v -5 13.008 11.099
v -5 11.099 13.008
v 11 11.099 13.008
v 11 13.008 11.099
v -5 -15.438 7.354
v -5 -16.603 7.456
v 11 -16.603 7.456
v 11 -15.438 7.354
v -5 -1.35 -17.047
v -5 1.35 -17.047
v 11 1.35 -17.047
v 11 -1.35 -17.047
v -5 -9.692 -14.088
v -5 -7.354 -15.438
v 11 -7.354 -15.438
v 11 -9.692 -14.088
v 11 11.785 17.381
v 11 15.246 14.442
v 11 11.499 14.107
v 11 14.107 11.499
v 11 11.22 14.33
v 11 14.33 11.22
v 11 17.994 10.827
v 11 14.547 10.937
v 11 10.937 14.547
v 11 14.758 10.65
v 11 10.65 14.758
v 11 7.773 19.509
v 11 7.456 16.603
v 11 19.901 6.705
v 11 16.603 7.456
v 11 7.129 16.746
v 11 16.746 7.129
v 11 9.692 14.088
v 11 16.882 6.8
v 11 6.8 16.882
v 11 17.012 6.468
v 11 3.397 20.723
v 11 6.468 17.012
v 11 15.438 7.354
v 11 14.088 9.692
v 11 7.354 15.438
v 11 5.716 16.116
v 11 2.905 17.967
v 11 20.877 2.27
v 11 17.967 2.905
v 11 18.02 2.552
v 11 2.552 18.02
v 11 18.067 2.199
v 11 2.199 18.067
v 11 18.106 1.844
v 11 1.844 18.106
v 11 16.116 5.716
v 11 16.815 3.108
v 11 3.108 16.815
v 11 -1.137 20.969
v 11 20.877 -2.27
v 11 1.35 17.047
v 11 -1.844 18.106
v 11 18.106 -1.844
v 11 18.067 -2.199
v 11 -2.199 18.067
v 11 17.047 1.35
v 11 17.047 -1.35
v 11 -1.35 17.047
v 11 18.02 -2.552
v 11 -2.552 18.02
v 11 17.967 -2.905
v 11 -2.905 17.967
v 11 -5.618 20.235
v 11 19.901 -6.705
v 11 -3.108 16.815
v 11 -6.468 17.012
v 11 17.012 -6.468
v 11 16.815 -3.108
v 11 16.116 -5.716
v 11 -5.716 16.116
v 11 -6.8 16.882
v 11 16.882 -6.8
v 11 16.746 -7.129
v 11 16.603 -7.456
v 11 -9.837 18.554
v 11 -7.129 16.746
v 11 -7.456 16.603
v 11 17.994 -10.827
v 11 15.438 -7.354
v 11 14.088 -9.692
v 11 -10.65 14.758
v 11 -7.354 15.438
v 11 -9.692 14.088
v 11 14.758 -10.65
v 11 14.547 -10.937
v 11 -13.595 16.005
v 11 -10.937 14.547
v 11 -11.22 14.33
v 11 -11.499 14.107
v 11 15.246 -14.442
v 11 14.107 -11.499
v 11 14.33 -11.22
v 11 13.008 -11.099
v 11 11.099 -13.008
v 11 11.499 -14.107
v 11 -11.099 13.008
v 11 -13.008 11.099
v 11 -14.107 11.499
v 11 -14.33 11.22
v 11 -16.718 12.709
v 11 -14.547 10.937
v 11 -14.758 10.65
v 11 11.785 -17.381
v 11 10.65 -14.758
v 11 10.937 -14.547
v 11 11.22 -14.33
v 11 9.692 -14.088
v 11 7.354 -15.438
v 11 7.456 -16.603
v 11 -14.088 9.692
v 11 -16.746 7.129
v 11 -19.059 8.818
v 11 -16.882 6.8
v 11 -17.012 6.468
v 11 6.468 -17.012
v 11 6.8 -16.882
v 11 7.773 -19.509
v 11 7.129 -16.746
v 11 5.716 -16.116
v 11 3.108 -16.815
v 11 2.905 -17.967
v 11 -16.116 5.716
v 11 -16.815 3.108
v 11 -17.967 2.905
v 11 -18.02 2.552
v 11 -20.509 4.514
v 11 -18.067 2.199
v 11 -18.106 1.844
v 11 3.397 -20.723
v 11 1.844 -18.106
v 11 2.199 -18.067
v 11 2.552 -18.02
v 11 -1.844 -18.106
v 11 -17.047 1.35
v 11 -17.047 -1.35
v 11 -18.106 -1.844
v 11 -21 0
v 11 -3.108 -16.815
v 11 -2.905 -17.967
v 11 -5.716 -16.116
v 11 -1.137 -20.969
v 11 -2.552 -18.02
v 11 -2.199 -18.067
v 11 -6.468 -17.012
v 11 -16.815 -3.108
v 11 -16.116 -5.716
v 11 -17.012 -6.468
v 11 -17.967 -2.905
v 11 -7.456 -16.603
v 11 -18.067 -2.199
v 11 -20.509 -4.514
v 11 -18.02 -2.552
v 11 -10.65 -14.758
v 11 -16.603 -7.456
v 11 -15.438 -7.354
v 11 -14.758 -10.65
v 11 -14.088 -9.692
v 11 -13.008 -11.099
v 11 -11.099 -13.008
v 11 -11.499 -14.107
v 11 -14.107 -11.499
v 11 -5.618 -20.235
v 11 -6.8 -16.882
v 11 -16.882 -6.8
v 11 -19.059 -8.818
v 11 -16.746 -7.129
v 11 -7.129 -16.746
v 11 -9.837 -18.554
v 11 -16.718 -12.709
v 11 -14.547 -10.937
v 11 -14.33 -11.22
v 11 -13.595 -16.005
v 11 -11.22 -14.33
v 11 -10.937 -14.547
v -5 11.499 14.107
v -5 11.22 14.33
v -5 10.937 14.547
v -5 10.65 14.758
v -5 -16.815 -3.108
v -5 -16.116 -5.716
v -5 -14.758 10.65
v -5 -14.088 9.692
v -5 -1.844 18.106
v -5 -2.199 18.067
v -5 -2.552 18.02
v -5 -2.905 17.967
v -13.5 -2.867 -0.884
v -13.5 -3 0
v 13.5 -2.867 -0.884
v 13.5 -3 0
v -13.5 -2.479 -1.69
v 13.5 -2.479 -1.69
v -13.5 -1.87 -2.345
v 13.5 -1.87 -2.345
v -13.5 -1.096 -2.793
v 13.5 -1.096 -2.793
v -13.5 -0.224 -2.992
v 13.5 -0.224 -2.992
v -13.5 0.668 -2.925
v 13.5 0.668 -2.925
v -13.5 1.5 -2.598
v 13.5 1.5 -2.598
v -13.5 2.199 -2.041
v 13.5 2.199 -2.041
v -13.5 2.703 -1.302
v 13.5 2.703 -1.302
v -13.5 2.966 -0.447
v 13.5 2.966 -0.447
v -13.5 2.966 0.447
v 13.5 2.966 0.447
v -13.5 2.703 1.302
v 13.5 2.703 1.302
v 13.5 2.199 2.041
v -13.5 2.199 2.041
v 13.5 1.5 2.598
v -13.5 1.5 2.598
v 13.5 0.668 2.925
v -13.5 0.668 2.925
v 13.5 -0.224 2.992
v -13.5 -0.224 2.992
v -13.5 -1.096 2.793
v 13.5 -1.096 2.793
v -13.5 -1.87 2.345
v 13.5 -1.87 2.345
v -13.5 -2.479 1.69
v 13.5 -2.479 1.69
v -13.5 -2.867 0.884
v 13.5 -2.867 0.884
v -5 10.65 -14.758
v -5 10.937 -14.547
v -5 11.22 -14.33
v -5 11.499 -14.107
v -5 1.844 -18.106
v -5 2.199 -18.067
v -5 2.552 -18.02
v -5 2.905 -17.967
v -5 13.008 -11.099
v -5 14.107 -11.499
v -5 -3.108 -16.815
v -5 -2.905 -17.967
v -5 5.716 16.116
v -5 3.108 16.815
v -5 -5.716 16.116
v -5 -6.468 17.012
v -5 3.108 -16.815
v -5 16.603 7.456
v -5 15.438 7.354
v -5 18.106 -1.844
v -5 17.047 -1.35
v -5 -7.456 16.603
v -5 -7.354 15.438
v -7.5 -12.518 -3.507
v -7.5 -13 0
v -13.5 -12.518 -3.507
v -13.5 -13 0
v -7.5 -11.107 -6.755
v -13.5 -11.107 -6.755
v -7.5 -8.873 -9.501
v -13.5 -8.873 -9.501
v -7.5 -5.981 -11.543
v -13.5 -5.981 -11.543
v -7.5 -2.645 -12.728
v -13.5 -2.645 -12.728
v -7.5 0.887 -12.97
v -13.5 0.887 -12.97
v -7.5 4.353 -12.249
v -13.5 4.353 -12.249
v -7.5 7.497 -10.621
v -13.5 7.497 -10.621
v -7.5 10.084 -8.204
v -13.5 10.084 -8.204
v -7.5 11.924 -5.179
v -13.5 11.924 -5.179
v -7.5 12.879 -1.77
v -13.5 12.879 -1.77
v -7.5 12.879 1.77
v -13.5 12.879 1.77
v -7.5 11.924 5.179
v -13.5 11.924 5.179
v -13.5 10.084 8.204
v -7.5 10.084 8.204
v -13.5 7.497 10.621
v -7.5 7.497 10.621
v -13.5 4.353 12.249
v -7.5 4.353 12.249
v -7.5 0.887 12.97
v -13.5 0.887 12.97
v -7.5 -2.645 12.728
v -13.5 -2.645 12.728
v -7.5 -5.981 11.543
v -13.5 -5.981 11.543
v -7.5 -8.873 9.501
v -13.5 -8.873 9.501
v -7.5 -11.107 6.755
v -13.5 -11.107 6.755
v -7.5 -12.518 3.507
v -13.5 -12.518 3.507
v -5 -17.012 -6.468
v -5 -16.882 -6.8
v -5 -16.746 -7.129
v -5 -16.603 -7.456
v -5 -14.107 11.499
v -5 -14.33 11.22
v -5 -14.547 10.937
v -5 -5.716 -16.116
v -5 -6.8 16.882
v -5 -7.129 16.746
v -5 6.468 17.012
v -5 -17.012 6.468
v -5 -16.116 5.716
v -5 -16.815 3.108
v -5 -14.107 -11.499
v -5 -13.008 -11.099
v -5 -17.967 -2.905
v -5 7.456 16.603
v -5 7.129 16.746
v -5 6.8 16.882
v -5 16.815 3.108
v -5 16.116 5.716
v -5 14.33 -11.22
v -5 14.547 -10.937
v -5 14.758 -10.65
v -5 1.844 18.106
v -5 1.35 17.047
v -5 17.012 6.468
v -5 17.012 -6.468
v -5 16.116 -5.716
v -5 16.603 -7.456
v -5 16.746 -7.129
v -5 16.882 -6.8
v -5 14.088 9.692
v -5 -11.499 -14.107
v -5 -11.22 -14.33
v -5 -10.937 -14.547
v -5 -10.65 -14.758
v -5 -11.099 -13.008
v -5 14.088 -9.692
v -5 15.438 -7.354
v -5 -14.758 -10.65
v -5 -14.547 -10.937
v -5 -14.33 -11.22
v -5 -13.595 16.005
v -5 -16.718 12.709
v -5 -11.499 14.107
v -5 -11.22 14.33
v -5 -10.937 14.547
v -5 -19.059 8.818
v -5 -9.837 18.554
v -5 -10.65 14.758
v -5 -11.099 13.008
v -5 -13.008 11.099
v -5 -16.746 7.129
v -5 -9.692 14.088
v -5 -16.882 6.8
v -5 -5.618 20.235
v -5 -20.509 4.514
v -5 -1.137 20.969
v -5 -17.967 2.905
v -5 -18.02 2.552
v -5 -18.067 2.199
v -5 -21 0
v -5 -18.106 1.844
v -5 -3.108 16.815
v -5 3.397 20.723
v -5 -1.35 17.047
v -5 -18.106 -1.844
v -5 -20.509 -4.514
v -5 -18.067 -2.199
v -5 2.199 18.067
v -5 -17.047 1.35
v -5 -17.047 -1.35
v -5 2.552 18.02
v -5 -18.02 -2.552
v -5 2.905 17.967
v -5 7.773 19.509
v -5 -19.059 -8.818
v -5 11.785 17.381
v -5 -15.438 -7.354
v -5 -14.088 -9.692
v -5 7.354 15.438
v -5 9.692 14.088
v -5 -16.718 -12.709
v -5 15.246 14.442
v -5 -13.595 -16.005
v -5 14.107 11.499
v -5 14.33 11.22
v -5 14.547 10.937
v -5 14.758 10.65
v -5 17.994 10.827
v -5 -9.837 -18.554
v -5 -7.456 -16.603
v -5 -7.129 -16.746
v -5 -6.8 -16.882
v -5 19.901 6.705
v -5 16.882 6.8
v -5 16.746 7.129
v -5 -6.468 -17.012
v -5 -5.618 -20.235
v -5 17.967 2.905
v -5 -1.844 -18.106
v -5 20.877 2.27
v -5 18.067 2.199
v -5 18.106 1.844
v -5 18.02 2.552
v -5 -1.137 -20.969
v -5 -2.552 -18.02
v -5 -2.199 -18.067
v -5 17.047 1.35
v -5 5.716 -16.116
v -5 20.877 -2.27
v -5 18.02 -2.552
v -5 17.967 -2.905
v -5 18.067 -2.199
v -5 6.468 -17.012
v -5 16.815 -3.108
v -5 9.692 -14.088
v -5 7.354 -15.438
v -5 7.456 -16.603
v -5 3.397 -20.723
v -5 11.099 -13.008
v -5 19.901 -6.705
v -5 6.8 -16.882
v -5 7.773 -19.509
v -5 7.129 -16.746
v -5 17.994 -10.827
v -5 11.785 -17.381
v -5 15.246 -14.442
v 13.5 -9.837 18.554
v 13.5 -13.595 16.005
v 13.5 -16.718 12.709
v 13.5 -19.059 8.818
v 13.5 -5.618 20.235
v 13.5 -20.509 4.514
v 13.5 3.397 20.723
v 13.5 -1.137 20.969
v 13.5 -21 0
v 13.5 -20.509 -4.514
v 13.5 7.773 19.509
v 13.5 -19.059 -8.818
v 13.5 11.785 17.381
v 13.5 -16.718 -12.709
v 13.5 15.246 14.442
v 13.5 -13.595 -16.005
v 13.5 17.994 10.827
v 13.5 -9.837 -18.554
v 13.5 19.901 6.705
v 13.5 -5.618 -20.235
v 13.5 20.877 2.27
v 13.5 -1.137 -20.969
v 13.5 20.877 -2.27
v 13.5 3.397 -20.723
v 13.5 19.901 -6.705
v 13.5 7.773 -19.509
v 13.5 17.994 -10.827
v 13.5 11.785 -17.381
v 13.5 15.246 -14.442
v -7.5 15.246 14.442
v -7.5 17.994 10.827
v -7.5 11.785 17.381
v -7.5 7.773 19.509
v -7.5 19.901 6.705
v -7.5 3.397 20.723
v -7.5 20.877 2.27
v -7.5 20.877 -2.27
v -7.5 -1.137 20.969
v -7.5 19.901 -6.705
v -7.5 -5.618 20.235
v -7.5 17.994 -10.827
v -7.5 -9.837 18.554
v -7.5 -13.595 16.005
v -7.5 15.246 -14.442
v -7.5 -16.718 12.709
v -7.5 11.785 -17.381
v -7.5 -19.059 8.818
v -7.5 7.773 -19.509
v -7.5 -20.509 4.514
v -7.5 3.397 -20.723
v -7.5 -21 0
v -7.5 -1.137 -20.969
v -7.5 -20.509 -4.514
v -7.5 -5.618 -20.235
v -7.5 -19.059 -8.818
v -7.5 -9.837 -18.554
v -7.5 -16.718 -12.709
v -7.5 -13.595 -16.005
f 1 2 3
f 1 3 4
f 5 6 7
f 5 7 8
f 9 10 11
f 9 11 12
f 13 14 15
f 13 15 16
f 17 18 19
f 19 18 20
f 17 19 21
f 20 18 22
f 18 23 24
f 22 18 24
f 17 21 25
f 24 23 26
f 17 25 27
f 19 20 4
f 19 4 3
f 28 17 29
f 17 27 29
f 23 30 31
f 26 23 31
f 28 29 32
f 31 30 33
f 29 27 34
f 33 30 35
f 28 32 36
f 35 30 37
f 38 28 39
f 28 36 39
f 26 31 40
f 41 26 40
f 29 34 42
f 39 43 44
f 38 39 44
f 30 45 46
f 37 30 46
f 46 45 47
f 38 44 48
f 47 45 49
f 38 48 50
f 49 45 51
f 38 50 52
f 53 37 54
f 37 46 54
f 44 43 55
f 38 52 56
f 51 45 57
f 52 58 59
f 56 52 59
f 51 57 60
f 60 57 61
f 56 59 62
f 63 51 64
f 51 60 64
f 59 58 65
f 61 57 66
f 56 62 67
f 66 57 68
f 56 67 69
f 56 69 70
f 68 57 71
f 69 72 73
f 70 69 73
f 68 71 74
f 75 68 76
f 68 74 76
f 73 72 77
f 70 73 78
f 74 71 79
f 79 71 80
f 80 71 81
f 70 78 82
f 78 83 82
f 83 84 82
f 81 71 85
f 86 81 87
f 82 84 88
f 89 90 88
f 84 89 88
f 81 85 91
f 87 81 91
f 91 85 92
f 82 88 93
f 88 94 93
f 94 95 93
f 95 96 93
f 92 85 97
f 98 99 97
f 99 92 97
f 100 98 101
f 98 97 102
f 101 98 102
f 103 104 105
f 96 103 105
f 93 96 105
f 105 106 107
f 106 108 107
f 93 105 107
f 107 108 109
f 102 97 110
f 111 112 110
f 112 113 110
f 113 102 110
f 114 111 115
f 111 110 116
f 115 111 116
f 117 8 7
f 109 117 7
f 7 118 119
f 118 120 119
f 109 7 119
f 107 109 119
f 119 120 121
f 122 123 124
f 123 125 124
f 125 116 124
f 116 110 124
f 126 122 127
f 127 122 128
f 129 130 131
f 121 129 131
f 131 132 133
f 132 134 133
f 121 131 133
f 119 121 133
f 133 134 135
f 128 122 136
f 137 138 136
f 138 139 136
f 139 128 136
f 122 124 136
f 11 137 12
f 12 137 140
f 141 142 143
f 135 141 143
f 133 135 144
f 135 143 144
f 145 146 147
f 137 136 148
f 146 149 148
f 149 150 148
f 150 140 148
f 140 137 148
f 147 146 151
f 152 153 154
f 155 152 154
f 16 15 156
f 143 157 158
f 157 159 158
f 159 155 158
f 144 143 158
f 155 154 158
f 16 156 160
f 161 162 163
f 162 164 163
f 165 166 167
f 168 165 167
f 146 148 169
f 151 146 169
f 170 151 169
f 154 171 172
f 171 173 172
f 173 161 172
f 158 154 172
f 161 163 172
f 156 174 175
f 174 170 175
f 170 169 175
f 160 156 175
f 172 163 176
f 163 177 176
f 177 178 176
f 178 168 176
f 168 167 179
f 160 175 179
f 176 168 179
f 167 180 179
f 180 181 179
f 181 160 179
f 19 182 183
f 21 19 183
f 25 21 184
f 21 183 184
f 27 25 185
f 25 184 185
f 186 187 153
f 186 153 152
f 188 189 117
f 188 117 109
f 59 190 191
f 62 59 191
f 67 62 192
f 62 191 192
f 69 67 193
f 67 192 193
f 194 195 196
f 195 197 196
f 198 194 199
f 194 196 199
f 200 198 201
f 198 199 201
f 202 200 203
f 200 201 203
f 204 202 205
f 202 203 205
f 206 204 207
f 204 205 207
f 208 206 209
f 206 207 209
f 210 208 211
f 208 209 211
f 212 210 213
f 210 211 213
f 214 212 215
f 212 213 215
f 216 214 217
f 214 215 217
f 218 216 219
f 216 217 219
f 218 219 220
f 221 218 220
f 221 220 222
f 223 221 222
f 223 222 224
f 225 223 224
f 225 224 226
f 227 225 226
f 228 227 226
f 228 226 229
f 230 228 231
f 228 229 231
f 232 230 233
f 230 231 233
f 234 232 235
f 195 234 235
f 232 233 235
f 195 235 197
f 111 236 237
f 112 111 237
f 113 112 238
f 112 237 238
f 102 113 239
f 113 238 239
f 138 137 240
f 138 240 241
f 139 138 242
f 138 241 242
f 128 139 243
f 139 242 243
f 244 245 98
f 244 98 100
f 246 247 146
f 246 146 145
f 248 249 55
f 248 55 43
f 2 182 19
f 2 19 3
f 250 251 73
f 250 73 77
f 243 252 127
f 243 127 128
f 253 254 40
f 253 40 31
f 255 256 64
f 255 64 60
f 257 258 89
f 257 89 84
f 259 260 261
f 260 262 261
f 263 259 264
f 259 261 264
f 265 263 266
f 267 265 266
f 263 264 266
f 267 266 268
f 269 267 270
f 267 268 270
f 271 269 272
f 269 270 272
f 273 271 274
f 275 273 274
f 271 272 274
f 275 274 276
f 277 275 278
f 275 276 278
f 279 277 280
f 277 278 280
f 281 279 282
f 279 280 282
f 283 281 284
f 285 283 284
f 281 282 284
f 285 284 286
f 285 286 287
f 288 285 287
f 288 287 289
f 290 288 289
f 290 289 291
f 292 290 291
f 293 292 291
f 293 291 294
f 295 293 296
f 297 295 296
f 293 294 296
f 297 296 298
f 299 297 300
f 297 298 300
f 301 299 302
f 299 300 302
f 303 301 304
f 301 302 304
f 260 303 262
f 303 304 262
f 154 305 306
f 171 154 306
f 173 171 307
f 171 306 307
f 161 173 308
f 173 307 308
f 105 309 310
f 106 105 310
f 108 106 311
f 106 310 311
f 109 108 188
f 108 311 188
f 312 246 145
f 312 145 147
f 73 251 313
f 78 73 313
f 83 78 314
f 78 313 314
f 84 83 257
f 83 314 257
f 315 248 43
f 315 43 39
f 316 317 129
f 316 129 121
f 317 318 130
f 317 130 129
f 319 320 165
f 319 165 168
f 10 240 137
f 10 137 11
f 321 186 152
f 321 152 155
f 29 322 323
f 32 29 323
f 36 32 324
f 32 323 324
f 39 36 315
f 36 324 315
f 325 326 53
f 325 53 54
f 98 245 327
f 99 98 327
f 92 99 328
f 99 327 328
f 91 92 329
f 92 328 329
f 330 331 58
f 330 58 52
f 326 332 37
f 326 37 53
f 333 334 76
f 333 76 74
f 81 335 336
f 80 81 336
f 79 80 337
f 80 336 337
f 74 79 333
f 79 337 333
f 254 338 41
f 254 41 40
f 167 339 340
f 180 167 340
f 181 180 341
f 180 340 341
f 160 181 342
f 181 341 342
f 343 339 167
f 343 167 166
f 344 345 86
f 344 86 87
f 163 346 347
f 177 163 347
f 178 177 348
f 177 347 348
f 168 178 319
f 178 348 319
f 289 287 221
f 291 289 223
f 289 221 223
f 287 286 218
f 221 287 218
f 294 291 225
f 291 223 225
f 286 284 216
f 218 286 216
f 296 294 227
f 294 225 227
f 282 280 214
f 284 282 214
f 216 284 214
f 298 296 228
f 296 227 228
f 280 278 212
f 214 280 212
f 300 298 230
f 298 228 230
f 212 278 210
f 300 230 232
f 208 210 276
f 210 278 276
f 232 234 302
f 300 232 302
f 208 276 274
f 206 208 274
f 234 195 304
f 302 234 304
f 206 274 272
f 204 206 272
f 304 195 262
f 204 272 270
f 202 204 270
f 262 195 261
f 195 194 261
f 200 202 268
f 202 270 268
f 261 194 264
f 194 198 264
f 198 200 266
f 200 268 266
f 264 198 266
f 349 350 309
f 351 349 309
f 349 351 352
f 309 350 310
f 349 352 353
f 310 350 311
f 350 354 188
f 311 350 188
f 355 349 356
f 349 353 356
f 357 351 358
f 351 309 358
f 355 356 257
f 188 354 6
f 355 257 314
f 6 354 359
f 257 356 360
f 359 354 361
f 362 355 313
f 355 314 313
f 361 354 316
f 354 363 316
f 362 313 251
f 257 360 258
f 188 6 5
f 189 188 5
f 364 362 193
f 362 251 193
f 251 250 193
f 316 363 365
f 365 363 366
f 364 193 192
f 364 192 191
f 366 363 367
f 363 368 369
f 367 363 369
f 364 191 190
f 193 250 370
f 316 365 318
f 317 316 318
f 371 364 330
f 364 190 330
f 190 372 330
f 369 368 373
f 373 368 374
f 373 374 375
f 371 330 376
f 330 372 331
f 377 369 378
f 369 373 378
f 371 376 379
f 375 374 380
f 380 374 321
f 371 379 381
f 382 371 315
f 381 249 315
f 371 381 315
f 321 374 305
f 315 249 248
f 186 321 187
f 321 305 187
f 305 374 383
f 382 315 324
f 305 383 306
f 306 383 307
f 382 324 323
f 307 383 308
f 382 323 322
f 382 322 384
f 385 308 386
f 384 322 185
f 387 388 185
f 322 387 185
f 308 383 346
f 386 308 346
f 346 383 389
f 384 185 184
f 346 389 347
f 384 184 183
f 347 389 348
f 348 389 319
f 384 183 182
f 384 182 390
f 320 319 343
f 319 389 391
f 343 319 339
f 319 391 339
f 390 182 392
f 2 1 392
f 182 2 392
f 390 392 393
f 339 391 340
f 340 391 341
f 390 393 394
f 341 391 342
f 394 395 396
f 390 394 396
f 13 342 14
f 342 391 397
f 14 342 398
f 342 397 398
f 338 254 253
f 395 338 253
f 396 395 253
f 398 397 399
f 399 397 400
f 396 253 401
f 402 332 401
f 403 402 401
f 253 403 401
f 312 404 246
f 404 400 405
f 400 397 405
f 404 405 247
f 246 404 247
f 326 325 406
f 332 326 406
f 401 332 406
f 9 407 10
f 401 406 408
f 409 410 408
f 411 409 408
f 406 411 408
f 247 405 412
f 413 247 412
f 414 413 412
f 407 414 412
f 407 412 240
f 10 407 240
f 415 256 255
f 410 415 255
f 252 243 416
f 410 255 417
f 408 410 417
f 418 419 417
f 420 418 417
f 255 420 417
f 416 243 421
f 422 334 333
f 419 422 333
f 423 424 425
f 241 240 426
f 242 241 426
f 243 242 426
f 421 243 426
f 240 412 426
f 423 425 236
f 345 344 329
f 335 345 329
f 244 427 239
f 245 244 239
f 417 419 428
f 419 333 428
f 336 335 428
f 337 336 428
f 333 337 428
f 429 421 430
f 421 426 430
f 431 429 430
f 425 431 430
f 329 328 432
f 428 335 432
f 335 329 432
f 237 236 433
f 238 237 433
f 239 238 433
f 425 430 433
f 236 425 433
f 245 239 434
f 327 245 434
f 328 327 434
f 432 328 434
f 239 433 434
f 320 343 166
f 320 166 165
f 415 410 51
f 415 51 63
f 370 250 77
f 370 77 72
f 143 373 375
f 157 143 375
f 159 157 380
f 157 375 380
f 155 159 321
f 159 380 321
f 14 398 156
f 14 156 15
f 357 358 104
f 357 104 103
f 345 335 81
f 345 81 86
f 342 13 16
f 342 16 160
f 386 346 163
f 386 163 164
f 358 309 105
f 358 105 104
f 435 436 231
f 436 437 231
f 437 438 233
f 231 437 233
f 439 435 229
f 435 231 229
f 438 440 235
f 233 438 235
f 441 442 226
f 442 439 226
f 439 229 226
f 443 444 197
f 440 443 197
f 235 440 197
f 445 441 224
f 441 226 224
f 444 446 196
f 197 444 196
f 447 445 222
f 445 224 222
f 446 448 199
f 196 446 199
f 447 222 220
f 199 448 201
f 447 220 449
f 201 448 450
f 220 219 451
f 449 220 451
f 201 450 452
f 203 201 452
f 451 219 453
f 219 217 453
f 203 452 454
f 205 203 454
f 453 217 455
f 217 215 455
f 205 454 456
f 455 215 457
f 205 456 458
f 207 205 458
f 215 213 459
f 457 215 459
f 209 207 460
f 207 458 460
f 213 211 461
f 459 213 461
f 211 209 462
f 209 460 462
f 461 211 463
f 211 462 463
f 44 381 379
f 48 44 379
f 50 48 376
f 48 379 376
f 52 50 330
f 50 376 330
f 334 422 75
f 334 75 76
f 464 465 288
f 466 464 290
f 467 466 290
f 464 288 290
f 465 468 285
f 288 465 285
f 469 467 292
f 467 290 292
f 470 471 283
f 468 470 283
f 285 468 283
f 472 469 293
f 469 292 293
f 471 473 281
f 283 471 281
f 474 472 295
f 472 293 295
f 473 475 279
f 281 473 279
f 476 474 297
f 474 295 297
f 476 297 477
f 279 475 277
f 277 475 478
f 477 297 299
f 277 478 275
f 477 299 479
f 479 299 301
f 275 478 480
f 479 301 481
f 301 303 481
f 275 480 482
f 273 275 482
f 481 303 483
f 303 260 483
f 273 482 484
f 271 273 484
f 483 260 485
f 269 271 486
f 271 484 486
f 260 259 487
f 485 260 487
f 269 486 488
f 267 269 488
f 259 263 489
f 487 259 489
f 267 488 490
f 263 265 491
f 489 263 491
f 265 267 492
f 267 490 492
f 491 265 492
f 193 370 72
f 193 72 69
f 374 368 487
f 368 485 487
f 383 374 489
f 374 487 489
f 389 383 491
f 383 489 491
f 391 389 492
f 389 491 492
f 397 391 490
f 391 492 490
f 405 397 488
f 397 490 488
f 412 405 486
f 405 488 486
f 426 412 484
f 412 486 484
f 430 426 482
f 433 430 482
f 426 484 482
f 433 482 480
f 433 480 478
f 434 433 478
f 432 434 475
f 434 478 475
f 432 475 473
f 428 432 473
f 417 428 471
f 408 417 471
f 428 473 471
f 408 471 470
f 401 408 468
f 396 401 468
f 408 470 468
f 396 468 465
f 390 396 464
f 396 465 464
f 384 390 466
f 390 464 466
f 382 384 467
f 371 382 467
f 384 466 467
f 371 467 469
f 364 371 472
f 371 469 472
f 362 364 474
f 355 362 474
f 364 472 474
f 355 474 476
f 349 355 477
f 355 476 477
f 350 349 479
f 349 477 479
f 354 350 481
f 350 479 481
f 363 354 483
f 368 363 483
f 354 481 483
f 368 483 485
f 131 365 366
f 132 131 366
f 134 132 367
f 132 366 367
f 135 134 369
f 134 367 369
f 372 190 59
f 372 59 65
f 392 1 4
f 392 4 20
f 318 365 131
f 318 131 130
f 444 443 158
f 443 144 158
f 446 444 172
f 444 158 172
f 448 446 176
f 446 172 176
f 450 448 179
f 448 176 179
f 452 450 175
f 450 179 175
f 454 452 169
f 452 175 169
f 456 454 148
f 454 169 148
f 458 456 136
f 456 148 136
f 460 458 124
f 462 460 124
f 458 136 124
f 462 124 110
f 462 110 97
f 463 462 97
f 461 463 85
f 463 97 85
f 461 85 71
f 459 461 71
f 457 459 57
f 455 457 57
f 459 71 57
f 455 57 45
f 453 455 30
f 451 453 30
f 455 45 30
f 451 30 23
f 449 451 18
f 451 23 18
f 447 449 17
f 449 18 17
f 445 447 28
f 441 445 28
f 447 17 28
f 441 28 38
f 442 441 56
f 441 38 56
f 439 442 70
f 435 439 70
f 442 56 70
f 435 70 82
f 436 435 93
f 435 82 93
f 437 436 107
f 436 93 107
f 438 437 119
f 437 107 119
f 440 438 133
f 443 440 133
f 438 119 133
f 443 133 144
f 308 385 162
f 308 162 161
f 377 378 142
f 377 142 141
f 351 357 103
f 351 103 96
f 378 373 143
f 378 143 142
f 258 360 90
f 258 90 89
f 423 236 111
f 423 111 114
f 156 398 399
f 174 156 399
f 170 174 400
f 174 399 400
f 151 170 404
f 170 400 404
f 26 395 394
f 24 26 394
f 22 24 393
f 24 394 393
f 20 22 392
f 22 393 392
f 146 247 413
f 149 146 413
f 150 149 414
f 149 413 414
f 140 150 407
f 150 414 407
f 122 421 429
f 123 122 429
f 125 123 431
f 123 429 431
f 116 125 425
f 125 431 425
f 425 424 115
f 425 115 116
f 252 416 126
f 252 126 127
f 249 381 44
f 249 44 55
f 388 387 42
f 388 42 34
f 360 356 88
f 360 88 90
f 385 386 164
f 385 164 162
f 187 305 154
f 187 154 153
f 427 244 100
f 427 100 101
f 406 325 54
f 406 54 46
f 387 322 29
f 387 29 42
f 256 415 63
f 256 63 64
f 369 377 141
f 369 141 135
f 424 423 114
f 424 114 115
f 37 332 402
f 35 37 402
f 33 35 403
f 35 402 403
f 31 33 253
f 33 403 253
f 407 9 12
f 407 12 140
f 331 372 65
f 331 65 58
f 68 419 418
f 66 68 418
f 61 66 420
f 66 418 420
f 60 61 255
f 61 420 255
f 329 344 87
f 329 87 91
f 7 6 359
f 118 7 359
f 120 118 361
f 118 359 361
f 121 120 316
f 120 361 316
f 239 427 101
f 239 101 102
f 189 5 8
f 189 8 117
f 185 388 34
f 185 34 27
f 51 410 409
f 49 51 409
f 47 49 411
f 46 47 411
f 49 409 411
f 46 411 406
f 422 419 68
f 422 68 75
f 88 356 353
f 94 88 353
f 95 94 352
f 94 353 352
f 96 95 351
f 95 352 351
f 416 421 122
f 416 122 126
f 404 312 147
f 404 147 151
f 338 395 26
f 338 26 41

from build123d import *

# Parameters (mm, degrees)
CUT_EXTRUDE1_DEPTH = 16
CIRPATTERN1_COUNT  = 24


with BuildPart() as part:
    # Sketch1 → Revolve1 (revolve)
    with BuildSketch(Plane.XY, mode=Mode.PRIVATE) as revolve1_sk:
        Polygon((-13.5, 3), (13.5, 3), (13.5, 21), (11, 21), (11, 18.45), (11, 18.2), (-5, 18.2), (-5, 18.45), (-5, 21), (-7.5, 21), (-7.5, 13), (-13.5, 13), align=None)
    revolve(revolve1_sk.sketch.rotate(Axis((-13.5, 0, 0), (1, 0, 0)), 180), axis=Axis((-13.5, 0, 0), (1, 0, 0)))

    # Sketch3 → Cut-Extrude1 (cut)
    with BuildSketch(Plane(origin=(-5, 0, 0), x_dir=(0, 0, -1), z_dir=(1, 0, 0))):
        with BuildLine():
            Line((-1.844146703, 18.106328257), (-1.35, 17.046627232))
            Line((-1.35, 17.046627232), (1.35, 17.046627232))
            Line((1.35, 17.046627232), (1.844146703, 18.106328257))
            ThreePointArc((1.844146703, 18.106328257), (0, 18.2), (-1.844146703, 18.106328257))
        make_face()
    cut_extrude1 = extrude(amount=CUT_EXTRUDE1_DEPTH, mode=Mode.SUBTRACT)

    # CirPattern1: Cut-Extrude1 ×24 about axis
    cirpattern1_axis = Axis((0, 0, 0), (1, 0, 0))
    for i in range(1, CIRPATTERN1_COUNT):
        add(cut_extrude1.rotate(cirpattern1_axis, i * 360 / CIRPATTERN1_COUNT), mode=Mode.SUBTRACT)


solid = part.part
